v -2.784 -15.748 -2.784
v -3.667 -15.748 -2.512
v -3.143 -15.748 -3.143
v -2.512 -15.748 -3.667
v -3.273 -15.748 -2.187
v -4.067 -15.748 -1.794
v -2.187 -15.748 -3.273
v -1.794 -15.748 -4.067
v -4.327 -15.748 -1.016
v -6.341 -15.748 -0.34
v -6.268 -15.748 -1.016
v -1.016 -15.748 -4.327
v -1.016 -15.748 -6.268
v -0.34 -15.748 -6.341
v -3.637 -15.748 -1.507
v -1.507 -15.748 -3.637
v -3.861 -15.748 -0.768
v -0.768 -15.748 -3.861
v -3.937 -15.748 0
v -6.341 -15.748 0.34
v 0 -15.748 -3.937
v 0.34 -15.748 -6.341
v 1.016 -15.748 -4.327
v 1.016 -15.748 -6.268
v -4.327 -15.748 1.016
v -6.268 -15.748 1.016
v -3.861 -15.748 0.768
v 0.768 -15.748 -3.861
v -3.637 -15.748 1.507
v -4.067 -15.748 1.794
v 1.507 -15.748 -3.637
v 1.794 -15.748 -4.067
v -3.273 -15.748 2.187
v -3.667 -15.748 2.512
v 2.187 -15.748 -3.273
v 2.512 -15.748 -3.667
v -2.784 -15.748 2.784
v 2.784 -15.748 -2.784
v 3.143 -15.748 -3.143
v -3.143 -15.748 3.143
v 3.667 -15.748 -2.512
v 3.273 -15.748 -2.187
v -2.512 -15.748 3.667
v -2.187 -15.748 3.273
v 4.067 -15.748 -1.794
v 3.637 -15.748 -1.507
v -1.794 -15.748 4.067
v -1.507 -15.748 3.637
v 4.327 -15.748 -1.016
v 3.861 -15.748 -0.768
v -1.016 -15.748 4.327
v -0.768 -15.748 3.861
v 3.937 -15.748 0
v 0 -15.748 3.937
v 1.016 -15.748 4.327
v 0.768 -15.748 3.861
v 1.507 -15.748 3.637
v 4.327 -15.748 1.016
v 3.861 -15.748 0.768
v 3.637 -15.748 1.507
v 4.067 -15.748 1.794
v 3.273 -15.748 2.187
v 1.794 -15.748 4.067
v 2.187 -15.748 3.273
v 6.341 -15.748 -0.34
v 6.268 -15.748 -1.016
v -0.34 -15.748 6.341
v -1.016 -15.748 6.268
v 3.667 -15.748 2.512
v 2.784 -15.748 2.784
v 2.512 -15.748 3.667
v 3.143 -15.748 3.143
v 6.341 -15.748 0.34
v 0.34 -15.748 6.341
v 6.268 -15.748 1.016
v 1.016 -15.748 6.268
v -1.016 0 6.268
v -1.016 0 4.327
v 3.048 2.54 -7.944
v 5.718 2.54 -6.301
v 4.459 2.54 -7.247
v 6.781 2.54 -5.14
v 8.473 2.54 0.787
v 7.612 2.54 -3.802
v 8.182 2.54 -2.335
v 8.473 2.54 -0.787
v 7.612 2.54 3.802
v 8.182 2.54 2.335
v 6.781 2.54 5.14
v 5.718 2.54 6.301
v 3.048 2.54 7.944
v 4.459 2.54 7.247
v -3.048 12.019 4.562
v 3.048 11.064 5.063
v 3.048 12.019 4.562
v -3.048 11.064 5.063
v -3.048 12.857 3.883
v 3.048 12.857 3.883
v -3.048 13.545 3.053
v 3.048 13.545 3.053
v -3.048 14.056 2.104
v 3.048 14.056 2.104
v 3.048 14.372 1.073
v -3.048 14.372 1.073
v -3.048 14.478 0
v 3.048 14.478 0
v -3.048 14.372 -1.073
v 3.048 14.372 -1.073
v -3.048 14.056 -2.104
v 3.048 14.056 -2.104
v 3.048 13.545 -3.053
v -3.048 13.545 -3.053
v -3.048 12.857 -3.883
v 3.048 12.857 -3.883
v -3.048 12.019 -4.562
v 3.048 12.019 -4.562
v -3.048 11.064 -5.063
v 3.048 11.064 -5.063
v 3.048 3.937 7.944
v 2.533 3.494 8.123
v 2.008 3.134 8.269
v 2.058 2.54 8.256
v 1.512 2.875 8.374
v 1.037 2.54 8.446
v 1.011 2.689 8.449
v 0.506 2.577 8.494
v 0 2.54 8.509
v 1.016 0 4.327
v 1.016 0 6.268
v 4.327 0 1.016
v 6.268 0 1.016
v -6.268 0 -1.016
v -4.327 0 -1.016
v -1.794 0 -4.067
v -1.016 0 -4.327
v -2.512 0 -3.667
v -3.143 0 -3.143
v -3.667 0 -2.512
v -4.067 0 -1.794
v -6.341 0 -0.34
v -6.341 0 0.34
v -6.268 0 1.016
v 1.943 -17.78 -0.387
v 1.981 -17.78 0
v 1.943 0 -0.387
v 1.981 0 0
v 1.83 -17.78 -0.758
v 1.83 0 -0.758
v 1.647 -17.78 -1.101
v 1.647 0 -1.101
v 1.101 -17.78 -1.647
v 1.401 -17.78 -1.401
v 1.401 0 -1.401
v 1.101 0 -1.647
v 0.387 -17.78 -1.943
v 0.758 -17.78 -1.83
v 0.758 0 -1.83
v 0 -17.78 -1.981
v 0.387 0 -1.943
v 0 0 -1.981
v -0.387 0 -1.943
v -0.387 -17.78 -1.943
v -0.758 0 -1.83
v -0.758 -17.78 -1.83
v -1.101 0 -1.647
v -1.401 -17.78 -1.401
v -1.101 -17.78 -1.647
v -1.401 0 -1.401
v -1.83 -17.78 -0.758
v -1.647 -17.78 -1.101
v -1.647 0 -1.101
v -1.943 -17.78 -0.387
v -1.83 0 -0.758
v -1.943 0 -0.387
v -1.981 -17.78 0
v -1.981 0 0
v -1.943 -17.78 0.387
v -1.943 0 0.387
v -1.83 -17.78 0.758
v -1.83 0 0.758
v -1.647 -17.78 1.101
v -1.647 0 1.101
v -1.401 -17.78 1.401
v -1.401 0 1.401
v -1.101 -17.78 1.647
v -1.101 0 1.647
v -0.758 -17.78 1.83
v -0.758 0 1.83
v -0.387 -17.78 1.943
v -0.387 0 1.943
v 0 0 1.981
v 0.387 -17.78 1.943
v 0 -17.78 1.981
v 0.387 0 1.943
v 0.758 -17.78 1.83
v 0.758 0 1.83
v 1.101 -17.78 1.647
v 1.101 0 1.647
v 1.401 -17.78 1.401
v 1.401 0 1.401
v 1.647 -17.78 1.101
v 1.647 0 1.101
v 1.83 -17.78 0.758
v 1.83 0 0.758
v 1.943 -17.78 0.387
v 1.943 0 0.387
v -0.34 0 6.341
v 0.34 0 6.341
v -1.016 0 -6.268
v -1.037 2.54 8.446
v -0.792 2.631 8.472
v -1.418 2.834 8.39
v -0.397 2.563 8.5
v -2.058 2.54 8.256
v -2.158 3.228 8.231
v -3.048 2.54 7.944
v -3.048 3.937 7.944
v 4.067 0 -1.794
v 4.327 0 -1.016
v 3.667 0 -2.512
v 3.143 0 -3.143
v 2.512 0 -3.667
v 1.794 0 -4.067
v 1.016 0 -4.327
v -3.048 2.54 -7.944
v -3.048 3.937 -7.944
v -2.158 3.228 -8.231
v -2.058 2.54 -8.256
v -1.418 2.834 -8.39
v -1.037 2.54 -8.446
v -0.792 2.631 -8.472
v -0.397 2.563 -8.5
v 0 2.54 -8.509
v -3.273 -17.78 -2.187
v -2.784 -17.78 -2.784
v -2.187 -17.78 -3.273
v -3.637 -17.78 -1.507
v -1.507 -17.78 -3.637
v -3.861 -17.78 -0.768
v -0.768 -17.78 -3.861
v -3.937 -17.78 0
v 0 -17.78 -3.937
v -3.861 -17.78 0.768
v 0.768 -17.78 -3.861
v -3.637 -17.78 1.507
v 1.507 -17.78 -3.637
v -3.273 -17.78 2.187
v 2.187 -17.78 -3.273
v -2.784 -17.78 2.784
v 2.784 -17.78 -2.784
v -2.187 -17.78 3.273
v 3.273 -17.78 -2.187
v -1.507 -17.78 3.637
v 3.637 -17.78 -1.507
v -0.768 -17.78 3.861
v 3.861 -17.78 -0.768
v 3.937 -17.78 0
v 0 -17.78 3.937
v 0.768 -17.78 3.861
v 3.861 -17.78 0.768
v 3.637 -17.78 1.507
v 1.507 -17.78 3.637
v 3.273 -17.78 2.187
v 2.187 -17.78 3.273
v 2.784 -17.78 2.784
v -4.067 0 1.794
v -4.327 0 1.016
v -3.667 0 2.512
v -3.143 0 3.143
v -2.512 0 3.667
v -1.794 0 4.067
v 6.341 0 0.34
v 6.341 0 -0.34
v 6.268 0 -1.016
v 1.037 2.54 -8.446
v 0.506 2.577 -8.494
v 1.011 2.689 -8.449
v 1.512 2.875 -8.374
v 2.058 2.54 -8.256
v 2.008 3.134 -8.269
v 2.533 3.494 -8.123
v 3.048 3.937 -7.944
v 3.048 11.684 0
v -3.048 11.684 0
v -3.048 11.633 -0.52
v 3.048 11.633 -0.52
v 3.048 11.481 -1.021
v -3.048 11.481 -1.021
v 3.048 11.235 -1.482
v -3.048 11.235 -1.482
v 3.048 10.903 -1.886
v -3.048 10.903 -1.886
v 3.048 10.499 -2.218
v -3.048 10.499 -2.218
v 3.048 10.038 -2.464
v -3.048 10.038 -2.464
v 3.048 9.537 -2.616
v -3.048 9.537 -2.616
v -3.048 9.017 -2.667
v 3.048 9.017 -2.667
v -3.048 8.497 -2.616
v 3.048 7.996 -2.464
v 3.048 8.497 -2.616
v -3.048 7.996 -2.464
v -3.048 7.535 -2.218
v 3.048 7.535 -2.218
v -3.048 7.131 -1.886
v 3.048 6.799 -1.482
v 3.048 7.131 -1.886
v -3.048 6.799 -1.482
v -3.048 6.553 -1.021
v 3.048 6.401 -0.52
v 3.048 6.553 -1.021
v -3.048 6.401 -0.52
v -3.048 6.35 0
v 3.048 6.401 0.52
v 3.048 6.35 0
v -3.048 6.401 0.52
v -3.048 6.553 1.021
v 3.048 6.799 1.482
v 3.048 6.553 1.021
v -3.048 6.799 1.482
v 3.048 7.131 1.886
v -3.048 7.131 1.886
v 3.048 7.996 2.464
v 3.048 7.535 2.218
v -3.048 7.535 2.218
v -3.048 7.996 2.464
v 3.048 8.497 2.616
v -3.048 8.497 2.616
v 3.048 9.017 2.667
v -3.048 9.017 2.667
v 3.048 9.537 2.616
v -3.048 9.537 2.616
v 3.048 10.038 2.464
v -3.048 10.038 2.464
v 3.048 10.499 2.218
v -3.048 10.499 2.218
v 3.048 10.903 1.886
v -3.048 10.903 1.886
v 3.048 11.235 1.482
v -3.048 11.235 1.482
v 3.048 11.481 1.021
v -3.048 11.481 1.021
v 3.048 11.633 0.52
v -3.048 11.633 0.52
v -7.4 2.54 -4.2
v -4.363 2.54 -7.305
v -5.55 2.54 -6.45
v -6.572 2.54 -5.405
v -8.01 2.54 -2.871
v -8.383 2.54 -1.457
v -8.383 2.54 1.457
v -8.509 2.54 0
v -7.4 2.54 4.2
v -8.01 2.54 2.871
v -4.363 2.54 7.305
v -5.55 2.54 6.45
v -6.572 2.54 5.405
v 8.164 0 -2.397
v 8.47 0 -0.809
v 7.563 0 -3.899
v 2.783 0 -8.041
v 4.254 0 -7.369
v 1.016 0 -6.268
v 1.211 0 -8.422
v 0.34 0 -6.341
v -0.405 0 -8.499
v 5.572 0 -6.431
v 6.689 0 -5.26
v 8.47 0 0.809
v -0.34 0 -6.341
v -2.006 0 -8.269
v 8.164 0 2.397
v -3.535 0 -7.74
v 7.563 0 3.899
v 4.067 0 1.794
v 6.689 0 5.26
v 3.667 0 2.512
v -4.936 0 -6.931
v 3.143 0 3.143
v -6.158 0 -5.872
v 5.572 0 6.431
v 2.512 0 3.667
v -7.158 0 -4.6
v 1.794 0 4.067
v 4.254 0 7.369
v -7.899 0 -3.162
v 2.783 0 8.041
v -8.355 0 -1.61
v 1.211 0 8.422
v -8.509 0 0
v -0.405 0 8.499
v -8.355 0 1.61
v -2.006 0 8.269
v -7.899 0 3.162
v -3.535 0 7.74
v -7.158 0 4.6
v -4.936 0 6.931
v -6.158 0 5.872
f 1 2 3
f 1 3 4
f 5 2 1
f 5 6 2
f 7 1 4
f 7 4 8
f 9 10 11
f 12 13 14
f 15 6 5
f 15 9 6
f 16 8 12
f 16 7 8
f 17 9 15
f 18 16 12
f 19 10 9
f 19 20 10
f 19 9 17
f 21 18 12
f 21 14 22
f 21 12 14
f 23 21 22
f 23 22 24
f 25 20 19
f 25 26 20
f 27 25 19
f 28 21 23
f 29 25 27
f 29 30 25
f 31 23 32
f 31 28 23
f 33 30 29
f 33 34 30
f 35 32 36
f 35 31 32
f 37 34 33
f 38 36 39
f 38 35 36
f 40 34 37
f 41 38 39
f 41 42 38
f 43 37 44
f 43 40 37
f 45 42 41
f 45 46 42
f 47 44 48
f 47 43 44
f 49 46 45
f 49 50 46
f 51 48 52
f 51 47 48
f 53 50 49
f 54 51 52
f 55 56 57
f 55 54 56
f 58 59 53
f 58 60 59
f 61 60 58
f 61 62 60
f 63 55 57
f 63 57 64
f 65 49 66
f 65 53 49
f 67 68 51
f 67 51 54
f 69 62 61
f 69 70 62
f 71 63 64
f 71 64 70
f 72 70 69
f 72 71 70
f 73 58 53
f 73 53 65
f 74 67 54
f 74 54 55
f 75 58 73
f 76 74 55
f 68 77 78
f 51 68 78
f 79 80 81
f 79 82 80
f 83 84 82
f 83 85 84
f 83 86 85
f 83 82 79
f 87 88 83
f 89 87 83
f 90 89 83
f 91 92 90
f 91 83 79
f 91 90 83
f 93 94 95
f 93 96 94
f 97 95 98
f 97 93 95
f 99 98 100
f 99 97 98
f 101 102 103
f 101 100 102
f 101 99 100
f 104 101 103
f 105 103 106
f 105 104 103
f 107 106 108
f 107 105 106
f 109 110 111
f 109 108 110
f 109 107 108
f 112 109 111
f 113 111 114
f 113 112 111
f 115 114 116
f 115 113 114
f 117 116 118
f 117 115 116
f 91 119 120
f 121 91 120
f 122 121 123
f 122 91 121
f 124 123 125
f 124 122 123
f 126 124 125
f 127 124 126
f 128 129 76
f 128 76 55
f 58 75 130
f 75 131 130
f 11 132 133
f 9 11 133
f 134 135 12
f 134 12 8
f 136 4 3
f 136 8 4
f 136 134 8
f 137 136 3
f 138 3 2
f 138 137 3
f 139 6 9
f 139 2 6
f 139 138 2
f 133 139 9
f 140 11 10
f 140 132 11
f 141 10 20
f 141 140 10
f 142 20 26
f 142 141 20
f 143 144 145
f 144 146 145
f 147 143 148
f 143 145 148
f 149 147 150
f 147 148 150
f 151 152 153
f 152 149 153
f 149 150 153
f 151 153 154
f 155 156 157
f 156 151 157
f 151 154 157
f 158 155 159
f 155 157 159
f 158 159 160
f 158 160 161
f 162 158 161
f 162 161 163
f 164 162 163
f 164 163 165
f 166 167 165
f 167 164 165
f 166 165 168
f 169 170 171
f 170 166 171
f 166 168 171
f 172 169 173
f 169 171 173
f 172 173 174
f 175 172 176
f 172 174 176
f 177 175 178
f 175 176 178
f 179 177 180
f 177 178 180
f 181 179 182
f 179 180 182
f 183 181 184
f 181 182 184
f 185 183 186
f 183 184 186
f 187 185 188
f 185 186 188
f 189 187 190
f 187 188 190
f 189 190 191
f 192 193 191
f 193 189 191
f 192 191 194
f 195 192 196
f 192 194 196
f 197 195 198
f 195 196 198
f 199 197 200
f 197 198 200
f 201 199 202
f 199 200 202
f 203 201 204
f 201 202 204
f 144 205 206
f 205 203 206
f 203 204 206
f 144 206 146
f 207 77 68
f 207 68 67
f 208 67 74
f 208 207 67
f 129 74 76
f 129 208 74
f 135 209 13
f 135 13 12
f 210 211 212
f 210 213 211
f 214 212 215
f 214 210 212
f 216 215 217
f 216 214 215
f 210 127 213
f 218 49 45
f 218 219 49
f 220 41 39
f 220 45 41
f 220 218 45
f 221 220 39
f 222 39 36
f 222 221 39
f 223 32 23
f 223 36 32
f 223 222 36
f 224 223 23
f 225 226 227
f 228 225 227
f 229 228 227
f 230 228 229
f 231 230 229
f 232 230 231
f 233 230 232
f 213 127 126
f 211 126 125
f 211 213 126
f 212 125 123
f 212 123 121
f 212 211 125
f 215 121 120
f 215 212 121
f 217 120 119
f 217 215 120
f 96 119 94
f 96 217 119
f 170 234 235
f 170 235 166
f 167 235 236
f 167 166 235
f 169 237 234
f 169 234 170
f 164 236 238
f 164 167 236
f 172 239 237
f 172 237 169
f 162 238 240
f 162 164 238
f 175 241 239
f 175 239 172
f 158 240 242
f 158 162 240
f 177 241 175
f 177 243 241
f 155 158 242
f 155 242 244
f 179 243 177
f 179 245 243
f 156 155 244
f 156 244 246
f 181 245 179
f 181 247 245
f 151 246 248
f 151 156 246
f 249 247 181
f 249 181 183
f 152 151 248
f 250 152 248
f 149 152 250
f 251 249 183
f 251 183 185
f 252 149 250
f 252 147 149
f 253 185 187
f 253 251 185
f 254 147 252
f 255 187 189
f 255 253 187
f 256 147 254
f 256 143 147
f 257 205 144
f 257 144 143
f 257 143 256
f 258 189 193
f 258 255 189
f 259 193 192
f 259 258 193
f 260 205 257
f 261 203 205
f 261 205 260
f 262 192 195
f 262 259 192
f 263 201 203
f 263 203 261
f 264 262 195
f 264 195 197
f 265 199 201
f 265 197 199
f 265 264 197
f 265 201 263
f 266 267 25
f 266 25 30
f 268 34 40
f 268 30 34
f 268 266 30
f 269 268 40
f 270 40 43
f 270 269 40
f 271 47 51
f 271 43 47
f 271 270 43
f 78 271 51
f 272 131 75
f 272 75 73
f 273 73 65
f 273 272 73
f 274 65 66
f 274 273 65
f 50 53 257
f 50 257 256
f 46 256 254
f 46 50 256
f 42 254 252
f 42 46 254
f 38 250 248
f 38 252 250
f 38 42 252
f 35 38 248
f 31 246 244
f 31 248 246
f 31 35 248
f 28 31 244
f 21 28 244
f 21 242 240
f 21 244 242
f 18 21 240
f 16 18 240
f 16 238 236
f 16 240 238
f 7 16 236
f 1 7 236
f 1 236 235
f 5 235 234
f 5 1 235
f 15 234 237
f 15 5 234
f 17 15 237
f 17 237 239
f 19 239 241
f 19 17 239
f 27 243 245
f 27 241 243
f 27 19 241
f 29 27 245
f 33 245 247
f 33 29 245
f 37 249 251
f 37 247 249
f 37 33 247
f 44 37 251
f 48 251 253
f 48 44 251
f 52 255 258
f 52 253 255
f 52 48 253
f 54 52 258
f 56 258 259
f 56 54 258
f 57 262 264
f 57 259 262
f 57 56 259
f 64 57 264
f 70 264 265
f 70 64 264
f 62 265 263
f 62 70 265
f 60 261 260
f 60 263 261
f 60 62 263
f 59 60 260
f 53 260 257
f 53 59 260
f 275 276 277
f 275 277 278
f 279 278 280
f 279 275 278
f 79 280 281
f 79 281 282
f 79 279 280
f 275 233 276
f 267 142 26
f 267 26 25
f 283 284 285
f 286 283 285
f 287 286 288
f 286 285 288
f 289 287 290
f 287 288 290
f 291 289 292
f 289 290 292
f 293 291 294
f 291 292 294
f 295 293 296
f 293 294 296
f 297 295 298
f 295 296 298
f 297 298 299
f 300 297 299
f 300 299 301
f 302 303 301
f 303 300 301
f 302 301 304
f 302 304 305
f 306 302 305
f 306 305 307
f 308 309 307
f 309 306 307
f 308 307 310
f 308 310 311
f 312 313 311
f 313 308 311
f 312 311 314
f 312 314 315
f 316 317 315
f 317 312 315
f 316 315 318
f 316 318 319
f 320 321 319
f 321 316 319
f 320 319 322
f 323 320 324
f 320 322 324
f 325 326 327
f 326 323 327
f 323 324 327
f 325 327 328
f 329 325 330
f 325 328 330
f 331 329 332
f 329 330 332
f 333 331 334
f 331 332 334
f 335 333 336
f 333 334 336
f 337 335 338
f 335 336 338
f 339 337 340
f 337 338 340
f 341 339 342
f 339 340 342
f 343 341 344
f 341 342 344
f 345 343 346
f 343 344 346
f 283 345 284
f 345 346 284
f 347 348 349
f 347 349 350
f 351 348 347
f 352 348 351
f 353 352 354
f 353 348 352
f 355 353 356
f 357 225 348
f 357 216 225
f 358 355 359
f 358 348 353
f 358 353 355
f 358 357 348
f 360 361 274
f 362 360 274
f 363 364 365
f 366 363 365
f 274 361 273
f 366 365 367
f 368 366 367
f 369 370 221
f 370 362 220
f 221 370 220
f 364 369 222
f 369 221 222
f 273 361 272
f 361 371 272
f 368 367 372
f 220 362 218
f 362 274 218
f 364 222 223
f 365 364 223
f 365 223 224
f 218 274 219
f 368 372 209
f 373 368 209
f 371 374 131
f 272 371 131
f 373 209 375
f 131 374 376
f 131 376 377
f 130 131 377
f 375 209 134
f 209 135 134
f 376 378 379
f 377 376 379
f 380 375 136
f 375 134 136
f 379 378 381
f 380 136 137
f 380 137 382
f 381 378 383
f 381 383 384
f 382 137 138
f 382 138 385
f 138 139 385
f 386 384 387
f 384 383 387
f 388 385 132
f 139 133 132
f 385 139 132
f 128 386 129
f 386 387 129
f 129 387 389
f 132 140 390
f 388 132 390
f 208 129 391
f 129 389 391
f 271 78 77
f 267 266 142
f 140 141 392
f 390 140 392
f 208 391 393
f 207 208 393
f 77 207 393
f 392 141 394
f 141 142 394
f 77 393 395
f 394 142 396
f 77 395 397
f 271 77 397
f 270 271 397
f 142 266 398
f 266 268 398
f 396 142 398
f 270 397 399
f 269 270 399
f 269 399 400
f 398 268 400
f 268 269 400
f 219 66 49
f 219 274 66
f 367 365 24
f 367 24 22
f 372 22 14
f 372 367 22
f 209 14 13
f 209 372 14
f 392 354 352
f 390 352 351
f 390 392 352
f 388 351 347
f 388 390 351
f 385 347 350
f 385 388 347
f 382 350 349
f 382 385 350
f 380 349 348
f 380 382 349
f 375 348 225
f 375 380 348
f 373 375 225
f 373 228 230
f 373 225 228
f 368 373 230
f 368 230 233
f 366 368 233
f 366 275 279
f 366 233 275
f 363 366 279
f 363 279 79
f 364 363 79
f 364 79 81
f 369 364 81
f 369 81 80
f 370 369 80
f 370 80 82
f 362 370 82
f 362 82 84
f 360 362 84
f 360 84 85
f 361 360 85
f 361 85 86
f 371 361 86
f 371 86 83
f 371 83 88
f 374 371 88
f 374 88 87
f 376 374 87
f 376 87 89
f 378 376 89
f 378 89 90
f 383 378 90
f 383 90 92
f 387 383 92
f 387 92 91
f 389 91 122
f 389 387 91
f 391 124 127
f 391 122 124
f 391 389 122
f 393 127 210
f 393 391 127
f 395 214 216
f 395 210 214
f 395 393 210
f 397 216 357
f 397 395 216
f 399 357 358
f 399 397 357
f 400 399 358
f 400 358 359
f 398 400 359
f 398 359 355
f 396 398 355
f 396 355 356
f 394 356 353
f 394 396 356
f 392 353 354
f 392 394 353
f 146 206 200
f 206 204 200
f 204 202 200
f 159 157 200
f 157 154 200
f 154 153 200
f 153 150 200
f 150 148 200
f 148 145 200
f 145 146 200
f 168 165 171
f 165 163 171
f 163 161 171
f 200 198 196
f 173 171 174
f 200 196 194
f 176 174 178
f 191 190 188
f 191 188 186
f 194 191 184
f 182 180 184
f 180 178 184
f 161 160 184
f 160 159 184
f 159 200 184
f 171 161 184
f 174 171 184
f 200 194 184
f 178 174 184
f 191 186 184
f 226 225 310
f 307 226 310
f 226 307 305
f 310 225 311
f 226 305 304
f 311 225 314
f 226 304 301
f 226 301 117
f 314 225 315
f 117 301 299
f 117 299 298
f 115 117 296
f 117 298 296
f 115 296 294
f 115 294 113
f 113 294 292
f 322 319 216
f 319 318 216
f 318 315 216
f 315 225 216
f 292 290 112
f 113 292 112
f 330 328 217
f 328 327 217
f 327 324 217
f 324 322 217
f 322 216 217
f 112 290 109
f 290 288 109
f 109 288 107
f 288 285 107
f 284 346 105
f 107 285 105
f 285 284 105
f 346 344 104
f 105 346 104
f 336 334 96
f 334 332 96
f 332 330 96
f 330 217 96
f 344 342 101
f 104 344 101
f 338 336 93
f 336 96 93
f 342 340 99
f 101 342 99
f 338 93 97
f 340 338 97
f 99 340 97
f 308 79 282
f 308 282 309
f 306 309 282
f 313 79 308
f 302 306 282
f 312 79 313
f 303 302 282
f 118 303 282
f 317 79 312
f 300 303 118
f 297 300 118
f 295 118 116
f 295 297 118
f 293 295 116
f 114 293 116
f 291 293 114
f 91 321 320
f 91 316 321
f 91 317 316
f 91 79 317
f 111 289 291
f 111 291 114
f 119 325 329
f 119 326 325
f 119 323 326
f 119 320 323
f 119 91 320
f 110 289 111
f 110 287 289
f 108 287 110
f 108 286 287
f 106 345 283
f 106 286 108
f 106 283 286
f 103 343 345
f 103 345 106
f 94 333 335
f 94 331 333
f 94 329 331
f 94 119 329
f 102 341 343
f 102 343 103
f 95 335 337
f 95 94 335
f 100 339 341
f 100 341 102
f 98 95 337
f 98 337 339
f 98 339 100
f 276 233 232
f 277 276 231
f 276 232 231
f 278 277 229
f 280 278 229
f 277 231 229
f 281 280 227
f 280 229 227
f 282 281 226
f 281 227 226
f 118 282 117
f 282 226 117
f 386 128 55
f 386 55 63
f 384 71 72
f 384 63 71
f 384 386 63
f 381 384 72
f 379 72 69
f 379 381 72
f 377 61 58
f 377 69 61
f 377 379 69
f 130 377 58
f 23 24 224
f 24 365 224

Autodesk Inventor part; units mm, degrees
ref_plane "YZ Plane" through (0, 0, 0) normal (1, 0, 0) x (0, 1, 0)
ref_plane "XZ Plane" through (0, 0, 0) normal (0, 1, 0) x (-1, 0, 0)
ref_plane "XY Plane" through (0, 0, 0) normal (0, 0, 1) x (1, 0, 0)
sketch "Sketch8" plane through (0, 0, 0) normal (0, 1, 0) x (-1, 0, 0)
  circle A0 centre (0, 0) radius 8.509
  dimension "d28" = 17.018
extrude "Extrusion7" add sketch "Sketch8" along normal blind 2.54
sketch "Sketch9" plane through (0, 0, 0) normal (1, 0, 0) x (0, 1, 0)
  line L0 (0, 8.509) -> (2.54, 8.509) projected
  line L1 (2.54, 8.509) -> (2.54, -8.509) projected
  line L2 (0, -8.509) -> (2.54, -8.509) projected
  line L3 (2.54, 8.509) -> (2.54, -8.509)
  line L4 (2.54, -8.509) -> (11.0639, -5.0629)
  line L5 (2.54, 8.509) -> (11.0639, 5.0629)
  arc A0 (11.0639, -5.0629) -> (11.0639, 5.0629) centre (9.017, 0) ccw
  circle A1 centre (9.017, 0) radius 2.667
  line L6 (-3.0224, 0) -> (5.6412, 0) construction
  line L7 (14.478, 5.5398) -> (14.478, 0.9968) construction
  point P0 (0, 0)
  dimension "d31" = 10.922
  dimension "d32" = 5.334
  dimension "d33" = 11.938
extrude "Extrusion8" add sketch "Sketch9" along normal mid plane 6.096
sketch "Sketch10" plane through (0, 2.54, 0) normal (0, 1, 0) x (1, 0, 0)
  arc A0 (3.048, -7.9444) -> (3.048, 7.9444) centre (0, 0) ccw projected
  circle A1 centre (0, 0) radius 8.509
  circle A2 centre (0, 0) radius 9.0384
  arc A3 (-3.048, 7.9444) -> (-3.048, -7.9444) centre (0, 0) ccw projected
  point P0 (-3.048, 8.509)
extrude "Extrusion9" cut sketch "Sketch10" along normal blind 12.7
sketch "Sketch11" plane through (0, 0, 0) normal (0, -1, 0) x (1, 0, 0)
  circle A0 centre (0, 0) radius 8.509 projected
  circle A1 centre (0, 0) radius 1.9812
  arc A2 (-6.2682, 1.016) -> (-6.2682, -1.016) centre (0, 0) ccw
  line L0 (-6.2682, 1.016) -> (-4.3273, 1.016)
  line L1 (-6.2682, -1.016) -> (-4.3273, -1.016)
  arc A3 (-1.016, -6.2682) -> (1.016, -6.2682) centre (0, 0) ccw
  line L2 (-1.016, -6.2682) -> (-1.016, -4.3273)
  line L3 (1.016, -6.2682) -> (1.016, -4.3273)
  arc A4 (6.2682, -1.016) -> (6.2682, 1.016) centre (0, 0) ccw
  line L4 (6.2682, -1.016) -> (4.3273, -1.016)
  line L5 (6.2682, 1.016) -> (4.3273, 1.016)
  arc A5 (1.016, 6.2682) -> (-1.016, 6.2682) centre (0, 0) ccw
  line L6 (1.016, 6.2682) -> (1.016, 4.3273)
  line L7 (-1.016, 6.2682) -> (-1.016, 4.3273)
  arc A6 (-1.016, 4.3273) -> (-4.3273, 1.016) centre (0, 0) ccw
  arc A7 (4.3273, 1.016) -> (1.016, 4.3273) centre (0, 0) ccw
  arc A8 (-4.3273, -1.016) -> (-1.016, -4.3273) centre (0, 0) ccw
  arc A9 (1.016, -4.3273) -> (4.3273, -1.016) centre (0, 0) ccw
  dimension "d38" = 3.9624
  dimension "d40" = 12.7
  dimension "d41" = 2.032
  dimension "d42" = 1.016
  dimension "d45" = 360
extrude "Extrusion10" add sketch "Sketch11" along normal blind 15.748 contours L0 A6 L7 A5 L6 A7 L5 A4 L4 A9 L3 A3 L2 A8 L1 A2
sketch "Sketch12" plane through (0, -15.748, 0) normal (0, -1, 0) x (1, 0, 0)
  circle A0 centre (0, 0) radius 1.9812 projected
  arc A1 (1.016, 6.2682) -> (-1.016, 6.2682) centre (0, 0) ccw projected
  circle A2 centre (0, 0) radius 1.9812
  circle A3 centre (0, 0) radius 3.937
  dimension "d49" = 7.874
extrude "Extrusion11" add sketch "Sketch12" along normal blind 2.032
properties part number "Shock Mount - Bottom"
